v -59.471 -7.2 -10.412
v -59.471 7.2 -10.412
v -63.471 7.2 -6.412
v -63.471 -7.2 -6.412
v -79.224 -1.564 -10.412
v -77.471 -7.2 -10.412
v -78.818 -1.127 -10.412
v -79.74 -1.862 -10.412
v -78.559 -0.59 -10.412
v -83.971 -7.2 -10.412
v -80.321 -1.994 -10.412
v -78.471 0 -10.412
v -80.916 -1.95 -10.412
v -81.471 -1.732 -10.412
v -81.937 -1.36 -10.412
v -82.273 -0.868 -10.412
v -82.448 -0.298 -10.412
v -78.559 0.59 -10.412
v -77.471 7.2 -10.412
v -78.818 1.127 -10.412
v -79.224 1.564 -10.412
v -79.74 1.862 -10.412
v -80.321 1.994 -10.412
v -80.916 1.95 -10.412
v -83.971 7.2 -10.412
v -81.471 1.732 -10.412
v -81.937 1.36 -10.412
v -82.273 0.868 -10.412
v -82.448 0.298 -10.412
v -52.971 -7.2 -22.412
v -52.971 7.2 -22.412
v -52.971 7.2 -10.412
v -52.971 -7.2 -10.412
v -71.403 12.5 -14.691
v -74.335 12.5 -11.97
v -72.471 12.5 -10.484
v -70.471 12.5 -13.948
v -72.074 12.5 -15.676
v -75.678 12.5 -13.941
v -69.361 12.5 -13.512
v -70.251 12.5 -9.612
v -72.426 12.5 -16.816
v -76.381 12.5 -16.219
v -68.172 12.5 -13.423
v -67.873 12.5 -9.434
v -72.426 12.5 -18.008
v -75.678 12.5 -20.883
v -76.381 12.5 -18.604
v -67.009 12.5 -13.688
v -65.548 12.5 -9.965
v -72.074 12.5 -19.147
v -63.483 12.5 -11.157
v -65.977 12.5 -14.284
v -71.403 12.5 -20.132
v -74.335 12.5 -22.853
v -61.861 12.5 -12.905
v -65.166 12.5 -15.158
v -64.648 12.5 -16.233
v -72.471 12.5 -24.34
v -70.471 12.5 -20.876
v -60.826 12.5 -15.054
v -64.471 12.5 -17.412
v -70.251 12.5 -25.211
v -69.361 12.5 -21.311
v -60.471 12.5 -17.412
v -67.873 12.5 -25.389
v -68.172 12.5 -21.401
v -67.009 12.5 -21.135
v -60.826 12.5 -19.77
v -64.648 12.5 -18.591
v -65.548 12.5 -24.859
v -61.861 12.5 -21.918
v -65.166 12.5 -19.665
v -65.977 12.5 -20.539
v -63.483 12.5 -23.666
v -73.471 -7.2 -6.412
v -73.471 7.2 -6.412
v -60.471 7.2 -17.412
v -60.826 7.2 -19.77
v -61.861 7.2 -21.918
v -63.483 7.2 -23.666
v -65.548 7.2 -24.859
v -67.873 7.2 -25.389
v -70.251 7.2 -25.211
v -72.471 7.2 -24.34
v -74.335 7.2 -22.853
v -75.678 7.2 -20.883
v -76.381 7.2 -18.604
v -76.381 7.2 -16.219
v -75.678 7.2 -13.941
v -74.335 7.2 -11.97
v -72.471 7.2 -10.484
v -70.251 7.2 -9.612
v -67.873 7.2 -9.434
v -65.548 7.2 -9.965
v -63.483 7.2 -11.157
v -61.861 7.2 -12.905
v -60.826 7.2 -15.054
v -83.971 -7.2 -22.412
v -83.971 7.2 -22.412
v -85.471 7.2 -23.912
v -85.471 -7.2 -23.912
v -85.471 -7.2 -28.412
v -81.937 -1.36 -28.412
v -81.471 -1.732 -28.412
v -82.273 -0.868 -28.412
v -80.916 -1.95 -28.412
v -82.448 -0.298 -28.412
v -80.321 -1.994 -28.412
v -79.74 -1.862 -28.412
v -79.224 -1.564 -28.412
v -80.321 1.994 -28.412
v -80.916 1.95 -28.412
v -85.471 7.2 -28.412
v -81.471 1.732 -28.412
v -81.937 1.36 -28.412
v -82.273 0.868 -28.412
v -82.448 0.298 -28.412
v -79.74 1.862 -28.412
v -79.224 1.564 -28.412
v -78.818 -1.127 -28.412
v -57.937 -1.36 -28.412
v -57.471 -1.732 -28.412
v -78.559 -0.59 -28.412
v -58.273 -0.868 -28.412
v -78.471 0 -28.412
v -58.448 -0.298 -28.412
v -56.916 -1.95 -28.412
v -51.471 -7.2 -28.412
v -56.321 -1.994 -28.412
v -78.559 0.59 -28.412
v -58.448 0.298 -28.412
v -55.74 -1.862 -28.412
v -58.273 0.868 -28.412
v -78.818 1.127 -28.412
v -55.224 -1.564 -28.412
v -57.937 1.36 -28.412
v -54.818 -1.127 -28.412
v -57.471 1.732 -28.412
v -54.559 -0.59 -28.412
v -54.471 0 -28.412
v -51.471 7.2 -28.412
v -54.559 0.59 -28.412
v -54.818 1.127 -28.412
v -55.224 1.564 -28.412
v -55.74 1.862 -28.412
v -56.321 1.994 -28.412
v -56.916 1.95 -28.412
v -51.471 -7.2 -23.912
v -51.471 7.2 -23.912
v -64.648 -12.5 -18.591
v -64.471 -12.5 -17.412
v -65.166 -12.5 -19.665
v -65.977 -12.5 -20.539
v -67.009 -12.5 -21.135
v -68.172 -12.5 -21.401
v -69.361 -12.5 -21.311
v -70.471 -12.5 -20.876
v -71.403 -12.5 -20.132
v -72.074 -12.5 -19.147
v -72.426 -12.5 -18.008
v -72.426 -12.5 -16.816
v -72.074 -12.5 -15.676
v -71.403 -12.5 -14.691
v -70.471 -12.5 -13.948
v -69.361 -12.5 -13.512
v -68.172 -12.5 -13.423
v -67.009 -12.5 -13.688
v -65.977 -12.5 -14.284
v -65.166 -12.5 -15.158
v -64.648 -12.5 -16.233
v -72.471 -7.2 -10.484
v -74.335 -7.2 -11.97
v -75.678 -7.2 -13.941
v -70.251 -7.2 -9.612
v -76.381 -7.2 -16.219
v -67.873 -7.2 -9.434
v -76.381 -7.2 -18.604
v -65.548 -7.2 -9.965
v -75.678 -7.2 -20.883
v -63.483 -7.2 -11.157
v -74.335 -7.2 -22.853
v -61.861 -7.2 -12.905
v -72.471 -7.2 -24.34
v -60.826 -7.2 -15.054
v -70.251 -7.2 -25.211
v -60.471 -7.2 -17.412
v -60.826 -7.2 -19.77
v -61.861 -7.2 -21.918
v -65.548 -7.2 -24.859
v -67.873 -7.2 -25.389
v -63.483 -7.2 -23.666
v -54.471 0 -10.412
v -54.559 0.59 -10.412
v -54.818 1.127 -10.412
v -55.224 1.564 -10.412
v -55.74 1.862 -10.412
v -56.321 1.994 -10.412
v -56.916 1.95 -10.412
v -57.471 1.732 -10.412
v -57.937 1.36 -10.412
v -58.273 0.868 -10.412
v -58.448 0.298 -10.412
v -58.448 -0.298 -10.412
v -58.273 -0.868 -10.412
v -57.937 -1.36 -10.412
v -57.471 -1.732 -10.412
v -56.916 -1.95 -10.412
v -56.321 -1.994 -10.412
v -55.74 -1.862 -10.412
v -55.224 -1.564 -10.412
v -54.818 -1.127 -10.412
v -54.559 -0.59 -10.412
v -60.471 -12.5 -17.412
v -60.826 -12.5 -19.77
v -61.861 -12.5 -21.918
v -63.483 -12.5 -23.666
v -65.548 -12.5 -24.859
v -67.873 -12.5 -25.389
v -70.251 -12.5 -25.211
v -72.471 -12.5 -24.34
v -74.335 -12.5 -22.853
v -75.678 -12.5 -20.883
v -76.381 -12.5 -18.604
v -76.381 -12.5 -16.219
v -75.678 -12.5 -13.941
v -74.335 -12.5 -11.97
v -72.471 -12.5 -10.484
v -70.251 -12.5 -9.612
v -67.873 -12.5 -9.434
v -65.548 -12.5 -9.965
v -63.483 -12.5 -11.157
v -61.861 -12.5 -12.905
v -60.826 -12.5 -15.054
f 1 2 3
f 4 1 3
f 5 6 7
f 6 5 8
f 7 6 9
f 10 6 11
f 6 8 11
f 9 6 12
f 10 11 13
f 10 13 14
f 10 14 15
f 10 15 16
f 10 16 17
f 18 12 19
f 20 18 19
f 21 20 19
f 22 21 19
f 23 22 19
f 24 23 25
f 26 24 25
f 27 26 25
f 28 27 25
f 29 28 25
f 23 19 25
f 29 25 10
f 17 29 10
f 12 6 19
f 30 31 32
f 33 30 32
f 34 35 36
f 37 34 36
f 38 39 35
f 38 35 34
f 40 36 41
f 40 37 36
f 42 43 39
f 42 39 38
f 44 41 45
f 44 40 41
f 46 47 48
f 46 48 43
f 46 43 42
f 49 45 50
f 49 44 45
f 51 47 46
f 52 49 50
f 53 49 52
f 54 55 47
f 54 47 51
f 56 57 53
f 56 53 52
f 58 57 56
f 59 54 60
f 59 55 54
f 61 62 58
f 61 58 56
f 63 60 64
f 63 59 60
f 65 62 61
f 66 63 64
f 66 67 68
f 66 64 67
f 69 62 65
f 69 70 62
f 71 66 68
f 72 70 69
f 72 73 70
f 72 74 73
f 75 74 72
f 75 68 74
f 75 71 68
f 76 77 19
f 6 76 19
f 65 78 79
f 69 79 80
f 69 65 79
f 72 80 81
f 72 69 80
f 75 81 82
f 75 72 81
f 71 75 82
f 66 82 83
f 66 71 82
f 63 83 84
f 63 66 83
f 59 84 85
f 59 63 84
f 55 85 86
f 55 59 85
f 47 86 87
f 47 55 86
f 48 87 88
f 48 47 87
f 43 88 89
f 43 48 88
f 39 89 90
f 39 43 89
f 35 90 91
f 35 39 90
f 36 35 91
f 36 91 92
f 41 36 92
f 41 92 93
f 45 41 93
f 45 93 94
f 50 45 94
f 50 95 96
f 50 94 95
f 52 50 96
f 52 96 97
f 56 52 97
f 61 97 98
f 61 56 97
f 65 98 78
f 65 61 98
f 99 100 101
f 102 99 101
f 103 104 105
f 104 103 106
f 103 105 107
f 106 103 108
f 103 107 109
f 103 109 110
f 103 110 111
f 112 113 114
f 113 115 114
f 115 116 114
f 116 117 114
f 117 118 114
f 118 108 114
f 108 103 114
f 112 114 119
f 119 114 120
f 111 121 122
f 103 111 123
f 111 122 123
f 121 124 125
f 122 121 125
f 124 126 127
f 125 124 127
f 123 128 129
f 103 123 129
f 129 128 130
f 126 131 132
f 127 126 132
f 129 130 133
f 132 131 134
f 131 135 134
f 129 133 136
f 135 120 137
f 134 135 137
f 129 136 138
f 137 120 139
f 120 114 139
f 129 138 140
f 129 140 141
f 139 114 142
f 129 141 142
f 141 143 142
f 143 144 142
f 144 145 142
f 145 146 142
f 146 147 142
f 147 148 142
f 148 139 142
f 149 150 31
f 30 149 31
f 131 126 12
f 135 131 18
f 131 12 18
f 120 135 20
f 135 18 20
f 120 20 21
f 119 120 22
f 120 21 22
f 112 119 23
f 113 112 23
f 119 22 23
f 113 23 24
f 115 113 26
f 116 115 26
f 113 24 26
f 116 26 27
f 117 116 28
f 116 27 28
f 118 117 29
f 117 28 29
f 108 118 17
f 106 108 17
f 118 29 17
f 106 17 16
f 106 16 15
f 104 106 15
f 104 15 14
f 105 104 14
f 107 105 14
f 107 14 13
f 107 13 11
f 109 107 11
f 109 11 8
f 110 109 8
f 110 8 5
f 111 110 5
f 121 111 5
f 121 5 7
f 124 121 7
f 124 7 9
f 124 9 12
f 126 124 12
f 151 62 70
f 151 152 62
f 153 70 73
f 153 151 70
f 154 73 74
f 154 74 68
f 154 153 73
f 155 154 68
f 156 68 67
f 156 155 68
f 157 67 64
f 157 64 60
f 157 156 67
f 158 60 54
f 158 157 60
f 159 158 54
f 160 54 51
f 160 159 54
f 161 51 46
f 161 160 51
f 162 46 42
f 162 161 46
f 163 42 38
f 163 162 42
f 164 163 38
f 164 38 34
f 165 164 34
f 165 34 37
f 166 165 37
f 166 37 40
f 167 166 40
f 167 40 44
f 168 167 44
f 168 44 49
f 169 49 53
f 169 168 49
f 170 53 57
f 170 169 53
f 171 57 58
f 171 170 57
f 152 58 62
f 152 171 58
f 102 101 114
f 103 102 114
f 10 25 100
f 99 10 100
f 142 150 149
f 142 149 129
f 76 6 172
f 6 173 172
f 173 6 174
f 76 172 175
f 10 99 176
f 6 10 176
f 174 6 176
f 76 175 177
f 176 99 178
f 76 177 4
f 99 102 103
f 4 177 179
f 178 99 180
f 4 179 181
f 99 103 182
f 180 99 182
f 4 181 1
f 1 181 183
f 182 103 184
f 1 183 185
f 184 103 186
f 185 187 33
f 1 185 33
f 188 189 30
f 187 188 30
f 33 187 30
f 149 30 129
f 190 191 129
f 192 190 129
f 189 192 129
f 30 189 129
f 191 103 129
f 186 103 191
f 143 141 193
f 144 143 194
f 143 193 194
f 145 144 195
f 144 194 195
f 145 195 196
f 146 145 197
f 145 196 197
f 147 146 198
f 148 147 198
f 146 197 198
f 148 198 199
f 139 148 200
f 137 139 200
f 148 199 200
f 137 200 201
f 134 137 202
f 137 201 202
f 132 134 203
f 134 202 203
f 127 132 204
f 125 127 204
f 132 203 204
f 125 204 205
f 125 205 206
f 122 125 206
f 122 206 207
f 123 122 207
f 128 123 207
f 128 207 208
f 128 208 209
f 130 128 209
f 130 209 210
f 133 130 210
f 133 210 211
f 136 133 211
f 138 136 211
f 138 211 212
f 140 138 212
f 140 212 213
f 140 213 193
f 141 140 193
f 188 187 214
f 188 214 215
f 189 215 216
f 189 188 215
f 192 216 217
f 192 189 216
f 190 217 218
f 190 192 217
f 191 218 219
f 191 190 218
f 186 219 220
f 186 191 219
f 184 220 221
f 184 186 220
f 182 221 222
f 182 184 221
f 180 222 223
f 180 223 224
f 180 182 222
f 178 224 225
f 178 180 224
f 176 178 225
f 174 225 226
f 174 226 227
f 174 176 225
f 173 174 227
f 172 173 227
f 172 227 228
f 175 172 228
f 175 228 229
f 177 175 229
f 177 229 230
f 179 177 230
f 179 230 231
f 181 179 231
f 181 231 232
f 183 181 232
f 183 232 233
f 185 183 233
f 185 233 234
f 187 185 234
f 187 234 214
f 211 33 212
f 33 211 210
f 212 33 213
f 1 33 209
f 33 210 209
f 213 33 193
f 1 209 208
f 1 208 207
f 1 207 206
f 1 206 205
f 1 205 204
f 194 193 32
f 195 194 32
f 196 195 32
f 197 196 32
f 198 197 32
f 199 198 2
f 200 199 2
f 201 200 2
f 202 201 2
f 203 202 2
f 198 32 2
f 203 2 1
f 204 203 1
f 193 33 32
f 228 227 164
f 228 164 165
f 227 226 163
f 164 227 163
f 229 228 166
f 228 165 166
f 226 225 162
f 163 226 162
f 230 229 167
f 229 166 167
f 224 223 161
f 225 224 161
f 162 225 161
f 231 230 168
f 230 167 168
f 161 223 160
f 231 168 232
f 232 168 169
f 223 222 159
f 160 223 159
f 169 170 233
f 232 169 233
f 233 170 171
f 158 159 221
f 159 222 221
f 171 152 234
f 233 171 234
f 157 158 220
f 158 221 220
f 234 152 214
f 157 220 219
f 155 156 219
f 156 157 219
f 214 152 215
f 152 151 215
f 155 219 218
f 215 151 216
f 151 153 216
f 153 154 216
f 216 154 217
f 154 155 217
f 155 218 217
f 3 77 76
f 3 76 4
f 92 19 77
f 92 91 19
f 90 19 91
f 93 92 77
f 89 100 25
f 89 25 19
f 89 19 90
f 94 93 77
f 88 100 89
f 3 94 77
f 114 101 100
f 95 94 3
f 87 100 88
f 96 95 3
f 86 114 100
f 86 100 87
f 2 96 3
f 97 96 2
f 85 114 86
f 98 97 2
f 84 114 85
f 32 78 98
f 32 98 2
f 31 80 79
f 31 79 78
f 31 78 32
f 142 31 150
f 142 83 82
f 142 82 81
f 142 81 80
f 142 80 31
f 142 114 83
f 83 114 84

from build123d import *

# Parameters (mm, degrees)
SKETCH_1_R               = 8
SKETCH_1_R_2             = 4
EXTRUDE_1_DEPTH          = 12.5
SKETCH_2_W               = 34
SKETCH_2_H               = 22
SKETCH_2_R               = 8
EXTRUDE_2_DEPTH          = 7.2
CUT_EXTRUDE_1_DEPTH      = 13.5
CUT_EXTRUDE_1_DEPTH_BACK = 13.5
SKETCH_4_OUTSIDE_W       = 45.518
SKETCH_4_OUTSIDE_H       = 36.518
SKETCH_4_OUTSIDE_R       = 2
CUT_EXTRUDE_2_DEPTH      = 1
CUT_EXTRUDE_2_DEPTH_BACK = 29.411764706


with BuildPart() as part:
    # 草图1 → 凸台-拉伸1 (new body, symmetric)
    with BuildSketch(Plane(origin=(0, 0, 0), x_dir=(1, 0, 0), z_dir=(0, 1, 0))):
        with Locations((-68.470588235, 17.411764706)):
            Circle(SKETCH_1_R)
        with Locations((-68.470588235, 17.411764706)):
            Circle(SKETCH_1_R_2, mode=Mode.SUBTRACT)
    extrude(amount=EXTRUDE_1_DEPTH, both=True)

    # 草图2 → 凸台-拉伸2 (add, symmetric)
    with BuildSketch(Plane(origin=(0, 0, 0), x_dir=(1, 0, 0), z_dir=(0, 1, 0))):
        with Locations((-68.470588235, 17.411764706)):
            Rectangle(SKETCH_2_W, SKETCH_2_H)
        with Locations((-68.470588235, 17.411764706)):
            Circle(SKETCH_2_R, mode=Mode.SUBTRACT)
    extrude(amount=EXTRUDE_2_DEPTH, both=True)

    # 草图3 → 切除-拉伸1 (cut, two sides)
    with BuildSketch(Plane(origin=(0, 0, 0), x_dir=(1, 0, 0), z_dir=(0, 1, 0))) as cut_extrude_1_sk:
        Polygon((-52.970588235, 22.411764706), (-52.970588235, 10.411764706), (-59.470588235, 10.411764706), (-63.470588235, 6.411764706), (-51.470588235, 6.411764706), (-51.470588235, 23.911764706), align=None)
        Polygon((-85.470588235, 6.411764706), (-73.470588235, 6.411764706), (-77.470588235, 10.411764706), (-83.970588235, 10.411764706), (-83.970588235, 22.411764706), (-85.470588235, 23.911764706), align=None)
    extrude(amount=CUT_EXTRUDE_1_DEPTH, mode=Mode.SUBTRACT)
    extrude(cut_extrude_1_sk.sketch, amount=-CUT_EXTRUDE_1_DEPTH_BACK, mode=Mode.SUBTRACT)

    # 草图4 outside → 切除-拉伸2 (cut, two sides)
    with BuildSketch(Plane.XY) as cut_extrude_2_sk:
        with Locations((-68.471, 0)):
            Rectangle(SKETCH_4_OUTSIDE_W, SKETCH_4_OUTSIDE_H)
        Polygon((-60.470588235, 7.2), (-60.470588235, 12.5), (-76.470588235, 12.5), (-76.470588235, 7.2), (-85.470588235, 7.2), (-85.470588235, -7.2), (-76.470588235, -7.2), (-76.470588235, -12.5), (-60.470588235, -12.5), (-60.470588235, -7.2), (-51.470588235, -7.2), (-51.470588235, 7.2), align=None, mode=Mode.SUBTRACT)
        with Locations((-56.470588235, 0)):
            Circle(SKETCH_4_OUTSIDE_R)
        with Locations((-80.470588235, 0)):
            Circle(SKETCH_4_OUTSIDE_R)
    extrude(amount=CUT_EXTRUDE_2_DEPTH, mode=Mode.SUBTRACT)
    extrude(cut_extrude_2_sk.sketch, amount=-CUT_EXTRUDE_2_DEPTH_BACK, mode=Mode.SUBTRACT)


solid = part.part
